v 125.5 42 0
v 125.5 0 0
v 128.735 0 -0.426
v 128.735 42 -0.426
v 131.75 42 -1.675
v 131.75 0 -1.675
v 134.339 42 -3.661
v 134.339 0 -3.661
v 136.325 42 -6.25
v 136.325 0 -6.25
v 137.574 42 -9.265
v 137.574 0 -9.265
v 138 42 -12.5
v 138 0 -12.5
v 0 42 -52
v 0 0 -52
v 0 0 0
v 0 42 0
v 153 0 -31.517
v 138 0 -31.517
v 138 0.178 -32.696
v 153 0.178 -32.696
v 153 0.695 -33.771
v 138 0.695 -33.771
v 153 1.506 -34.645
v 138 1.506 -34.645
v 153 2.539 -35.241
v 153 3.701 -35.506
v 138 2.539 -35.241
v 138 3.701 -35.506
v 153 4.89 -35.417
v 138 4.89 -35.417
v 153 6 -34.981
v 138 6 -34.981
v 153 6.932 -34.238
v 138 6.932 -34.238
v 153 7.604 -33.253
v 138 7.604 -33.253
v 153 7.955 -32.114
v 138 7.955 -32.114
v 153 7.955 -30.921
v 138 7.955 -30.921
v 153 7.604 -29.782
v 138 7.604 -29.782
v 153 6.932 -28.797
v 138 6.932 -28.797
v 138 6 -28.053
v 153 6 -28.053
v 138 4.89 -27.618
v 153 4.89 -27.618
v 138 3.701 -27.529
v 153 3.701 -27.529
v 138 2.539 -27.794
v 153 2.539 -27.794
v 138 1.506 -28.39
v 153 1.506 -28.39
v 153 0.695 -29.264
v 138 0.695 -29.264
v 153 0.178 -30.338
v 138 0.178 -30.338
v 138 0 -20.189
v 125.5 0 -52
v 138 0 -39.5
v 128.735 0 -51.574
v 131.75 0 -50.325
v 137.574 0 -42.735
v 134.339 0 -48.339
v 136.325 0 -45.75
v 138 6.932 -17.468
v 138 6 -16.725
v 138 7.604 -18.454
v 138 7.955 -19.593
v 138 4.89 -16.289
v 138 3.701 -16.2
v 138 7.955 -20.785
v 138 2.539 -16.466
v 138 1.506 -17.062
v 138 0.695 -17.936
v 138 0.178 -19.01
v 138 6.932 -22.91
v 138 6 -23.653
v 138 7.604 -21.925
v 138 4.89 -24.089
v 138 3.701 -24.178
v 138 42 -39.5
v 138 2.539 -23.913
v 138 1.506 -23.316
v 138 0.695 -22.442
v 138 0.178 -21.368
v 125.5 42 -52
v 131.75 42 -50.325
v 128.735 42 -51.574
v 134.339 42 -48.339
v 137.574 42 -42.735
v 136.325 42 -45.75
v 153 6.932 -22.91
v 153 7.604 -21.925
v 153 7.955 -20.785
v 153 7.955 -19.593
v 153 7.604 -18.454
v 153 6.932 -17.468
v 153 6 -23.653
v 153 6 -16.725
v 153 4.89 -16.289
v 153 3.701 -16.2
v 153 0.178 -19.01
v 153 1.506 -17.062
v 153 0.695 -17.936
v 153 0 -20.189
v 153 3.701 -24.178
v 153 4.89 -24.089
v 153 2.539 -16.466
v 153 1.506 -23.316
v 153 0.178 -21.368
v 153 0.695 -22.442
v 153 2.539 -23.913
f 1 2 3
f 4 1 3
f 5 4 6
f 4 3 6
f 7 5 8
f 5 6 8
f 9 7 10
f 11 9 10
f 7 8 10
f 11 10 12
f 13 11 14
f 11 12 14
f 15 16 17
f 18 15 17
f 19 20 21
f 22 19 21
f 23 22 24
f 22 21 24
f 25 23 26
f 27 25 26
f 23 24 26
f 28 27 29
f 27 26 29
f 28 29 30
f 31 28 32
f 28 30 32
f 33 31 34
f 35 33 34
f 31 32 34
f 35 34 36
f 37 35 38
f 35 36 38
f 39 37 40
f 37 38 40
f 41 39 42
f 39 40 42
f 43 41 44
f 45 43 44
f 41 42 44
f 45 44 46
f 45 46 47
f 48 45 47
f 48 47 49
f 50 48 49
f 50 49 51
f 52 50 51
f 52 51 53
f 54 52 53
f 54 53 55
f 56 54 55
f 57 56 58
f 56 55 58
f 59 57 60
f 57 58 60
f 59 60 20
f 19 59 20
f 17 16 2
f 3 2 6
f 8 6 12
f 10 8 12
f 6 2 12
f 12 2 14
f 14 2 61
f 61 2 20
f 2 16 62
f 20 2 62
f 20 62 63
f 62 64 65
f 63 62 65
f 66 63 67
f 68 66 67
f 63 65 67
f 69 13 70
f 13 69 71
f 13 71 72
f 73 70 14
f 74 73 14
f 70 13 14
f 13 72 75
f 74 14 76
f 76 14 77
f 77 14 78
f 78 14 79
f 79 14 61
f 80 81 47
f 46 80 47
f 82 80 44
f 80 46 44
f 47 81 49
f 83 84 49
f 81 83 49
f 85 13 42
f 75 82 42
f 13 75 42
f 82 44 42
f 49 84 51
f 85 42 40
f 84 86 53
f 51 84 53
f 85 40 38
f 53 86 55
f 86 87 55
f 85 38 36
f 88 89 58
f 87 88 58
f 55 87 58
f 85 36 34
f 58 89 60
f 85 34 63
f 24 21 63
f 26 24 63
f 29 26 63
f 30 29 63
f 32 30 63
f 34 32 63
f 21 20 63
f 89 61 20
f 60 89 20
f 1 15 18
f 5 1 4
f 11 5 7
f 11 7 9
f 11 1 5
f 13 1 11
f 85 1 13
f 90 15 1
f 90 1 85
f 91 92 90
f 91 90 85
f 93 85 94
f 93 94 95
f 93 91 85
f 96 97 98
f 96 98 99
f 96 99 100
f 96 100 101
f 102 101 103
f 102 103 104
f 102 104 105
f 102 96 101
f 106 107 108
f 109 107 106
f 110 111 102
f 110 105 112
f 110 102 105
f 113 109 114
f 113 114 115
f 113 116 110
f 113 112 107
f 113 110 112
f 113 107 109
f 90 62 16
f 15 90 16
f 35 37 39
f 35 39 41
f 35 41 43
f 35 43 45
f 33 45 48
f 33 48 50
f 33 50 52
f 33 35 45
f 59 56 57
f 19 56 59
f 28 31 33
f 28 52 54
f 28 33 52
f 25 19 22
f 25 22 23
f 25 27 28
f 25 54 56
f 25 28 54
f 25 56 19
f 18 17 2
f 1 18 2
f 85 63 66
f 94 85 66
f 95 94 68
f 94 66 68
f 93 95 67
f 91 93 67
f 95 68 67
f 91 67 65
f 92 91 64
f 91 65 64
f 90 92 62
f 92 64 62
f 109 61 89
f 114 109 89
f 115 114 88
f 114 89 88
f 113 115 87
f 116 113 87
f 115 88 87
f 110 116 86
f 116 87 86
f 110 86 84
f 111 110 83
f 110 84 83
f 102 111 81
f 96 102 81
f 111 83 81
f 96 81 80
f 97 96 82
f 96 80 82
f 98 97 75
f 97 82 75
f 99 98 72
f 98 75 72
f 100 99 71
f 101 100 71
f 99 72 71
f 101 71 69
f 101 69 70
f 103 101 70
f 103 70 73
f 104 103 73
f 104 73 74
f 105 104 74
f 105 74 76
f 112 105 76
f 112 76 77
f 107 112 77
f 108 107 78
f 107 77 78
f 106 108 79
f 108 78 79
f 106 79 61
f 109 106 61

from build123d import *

# Parameters (mm, degrees)
SALIENTE_EXTRUIR1_DEPTH = 42
CROQUIS7_R              = 4
SALIENTE_EXTRUIR2_DEPTH = 15


with BuildPart() as part:
    # Croquis1 → Saliente-Extruir1 (new body)
    with BuildSketch(Plane(origin=(0, 0, 0), x_dir=(1, 0, 0), z_dir=(0, 1, 0))):
        with BuildLine():
            Line((0, 0), (125.5, 0))
            ThreePointArc((125.5, 0), (134.338834765, 3.661165235), (138, 12.5))
            Line((138, 12.5), (138, 39.5))
            ThreePointArc((138, 39.5), (134.338834765, 48.338834765), (125.5, 52))
            Line((125.5, 52), (0, 52))
            Line((0, 52), (0, 0))
        make_face()
    extrude(amount=SALIENTE_EXTRUIR1_DEPTH)

    # Croquis7 → Saliente-Extruir2 (add)
    with BuildSketch(Plane(origin=(138, 0, 0), x_dir=(0, 0, -1), z_dir=(1, 0, 0))):
        with Locations((20.189152703, 4)):
            Circle(CROQUIS7_R)
        with Locations((31.517370161, 4)):
            Circle(CROQUIS7_R)
    extrude(amount=SALIENTE_EXTRUIR2_DEPTH)


solid = part.part
